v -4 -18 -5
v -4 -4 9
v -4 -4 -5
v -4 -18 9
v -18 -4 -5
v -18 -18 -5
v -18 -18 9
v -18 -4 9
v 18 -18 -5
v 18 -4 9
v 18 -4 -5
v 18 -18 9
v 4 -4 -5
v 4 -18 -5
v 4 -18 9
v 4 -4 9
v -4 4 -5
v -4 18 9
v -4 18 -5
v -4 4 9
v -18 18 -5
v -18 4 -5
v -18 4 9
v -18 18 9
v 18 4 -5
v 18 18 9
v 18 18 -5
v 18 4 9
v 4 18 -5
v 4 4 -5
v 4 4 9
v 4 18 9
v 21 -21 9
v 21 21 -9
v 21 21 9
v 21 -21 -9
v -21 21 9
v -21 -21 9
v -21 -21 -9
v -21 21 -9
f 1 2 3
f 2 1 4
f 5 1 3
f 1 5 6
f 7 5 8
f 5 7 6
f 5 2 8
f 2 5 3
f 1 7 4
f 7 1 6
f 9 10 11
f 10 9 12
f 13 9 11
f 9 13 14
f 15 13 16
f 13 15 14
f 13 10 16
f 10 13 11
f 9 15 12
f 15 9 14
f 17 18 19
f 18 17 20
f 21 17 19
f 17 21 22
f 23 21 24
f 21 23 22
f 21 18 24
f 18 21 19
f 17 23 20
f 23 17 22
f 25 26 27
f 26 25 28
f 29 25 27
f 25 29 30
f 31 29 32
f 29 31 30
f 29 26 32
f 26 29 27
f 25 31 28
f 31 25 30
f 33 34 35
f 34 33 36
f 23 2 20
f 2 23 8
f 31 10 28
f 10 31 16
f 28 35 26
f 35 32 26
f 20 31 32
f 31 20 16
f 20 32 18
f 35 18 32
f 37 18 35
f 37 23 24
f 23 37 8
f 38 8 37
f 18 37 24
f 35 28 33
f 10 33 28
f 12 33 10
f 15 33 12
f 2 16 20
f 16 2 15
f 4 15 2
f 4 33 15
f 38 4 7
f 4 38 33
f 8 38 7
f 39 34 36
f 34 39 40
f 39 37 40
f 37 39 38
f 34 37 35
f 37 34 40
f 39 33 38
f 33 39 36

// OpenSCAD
$fn = 32;

// ----------------------------------------------------------------------
// Pocket plate 42 x 42 x 18
// 2 x 2 pockets 14 mm square, 14 mm deep
// ----------------------------------------------------------------------

// --- parameters (mm) ---
thickness = 18;  // plate thickness
floor_t = 4;     // material left under each pocket
pocket = 14;     // pocket side length
pitch_x = 22;    // pocket pitch along X
pitch_y = 22;    // pocket pitch along Y
cols = 2;        // pockets per row
rows = 2;        // rows of pockets

// --- derived feature positions (mm) ---
depth = thickness - floor_t;        // = 14   pocket depth, down to the floor
span_x = (cols - 1) * pitch_x;      // = 22   distance between outer pockets
span_y = (rows - 1) * pitch_y;      // = 22   distance between outer pocket rows
origin_x = -span_x / 2;             // = -11   X of the first pocket
origin_y = -span_y / 2;             // = -11   Y of the first pocket
plate = [span_x + pocket + 6, span_y + pocket + 6, thickness];  // = [42, 42, 18]   overall size: pockets plus 3 mm of wall on each side
feature_centers = [
  [origin_x + 0 * pitch_x, origin_y + 0 * pitch_y],
  [origin_x + 1 * pitch_x, origin_y + 0 * pitch_y],
  [origin_x + 0 * pitch_x, origin_y + 1 * pitch_y],
  [origin_x + 1 * pitch_x, origin_y + 1 * pitch_y]
];   // pocket centres, used verbatim by the cutter loop

// plate outline, then one pocket per centre in feature_centers
difference() {
  cube(plate, center = true);
  for (centre = feature_centers)
    translate([centre[0] - pocket / 2, centre[1] - pocket / 2, plate[2] / 2 - depth])
      cube([pocket, pocket, depth + 1]);  // centred on the declared pocket centre
}
